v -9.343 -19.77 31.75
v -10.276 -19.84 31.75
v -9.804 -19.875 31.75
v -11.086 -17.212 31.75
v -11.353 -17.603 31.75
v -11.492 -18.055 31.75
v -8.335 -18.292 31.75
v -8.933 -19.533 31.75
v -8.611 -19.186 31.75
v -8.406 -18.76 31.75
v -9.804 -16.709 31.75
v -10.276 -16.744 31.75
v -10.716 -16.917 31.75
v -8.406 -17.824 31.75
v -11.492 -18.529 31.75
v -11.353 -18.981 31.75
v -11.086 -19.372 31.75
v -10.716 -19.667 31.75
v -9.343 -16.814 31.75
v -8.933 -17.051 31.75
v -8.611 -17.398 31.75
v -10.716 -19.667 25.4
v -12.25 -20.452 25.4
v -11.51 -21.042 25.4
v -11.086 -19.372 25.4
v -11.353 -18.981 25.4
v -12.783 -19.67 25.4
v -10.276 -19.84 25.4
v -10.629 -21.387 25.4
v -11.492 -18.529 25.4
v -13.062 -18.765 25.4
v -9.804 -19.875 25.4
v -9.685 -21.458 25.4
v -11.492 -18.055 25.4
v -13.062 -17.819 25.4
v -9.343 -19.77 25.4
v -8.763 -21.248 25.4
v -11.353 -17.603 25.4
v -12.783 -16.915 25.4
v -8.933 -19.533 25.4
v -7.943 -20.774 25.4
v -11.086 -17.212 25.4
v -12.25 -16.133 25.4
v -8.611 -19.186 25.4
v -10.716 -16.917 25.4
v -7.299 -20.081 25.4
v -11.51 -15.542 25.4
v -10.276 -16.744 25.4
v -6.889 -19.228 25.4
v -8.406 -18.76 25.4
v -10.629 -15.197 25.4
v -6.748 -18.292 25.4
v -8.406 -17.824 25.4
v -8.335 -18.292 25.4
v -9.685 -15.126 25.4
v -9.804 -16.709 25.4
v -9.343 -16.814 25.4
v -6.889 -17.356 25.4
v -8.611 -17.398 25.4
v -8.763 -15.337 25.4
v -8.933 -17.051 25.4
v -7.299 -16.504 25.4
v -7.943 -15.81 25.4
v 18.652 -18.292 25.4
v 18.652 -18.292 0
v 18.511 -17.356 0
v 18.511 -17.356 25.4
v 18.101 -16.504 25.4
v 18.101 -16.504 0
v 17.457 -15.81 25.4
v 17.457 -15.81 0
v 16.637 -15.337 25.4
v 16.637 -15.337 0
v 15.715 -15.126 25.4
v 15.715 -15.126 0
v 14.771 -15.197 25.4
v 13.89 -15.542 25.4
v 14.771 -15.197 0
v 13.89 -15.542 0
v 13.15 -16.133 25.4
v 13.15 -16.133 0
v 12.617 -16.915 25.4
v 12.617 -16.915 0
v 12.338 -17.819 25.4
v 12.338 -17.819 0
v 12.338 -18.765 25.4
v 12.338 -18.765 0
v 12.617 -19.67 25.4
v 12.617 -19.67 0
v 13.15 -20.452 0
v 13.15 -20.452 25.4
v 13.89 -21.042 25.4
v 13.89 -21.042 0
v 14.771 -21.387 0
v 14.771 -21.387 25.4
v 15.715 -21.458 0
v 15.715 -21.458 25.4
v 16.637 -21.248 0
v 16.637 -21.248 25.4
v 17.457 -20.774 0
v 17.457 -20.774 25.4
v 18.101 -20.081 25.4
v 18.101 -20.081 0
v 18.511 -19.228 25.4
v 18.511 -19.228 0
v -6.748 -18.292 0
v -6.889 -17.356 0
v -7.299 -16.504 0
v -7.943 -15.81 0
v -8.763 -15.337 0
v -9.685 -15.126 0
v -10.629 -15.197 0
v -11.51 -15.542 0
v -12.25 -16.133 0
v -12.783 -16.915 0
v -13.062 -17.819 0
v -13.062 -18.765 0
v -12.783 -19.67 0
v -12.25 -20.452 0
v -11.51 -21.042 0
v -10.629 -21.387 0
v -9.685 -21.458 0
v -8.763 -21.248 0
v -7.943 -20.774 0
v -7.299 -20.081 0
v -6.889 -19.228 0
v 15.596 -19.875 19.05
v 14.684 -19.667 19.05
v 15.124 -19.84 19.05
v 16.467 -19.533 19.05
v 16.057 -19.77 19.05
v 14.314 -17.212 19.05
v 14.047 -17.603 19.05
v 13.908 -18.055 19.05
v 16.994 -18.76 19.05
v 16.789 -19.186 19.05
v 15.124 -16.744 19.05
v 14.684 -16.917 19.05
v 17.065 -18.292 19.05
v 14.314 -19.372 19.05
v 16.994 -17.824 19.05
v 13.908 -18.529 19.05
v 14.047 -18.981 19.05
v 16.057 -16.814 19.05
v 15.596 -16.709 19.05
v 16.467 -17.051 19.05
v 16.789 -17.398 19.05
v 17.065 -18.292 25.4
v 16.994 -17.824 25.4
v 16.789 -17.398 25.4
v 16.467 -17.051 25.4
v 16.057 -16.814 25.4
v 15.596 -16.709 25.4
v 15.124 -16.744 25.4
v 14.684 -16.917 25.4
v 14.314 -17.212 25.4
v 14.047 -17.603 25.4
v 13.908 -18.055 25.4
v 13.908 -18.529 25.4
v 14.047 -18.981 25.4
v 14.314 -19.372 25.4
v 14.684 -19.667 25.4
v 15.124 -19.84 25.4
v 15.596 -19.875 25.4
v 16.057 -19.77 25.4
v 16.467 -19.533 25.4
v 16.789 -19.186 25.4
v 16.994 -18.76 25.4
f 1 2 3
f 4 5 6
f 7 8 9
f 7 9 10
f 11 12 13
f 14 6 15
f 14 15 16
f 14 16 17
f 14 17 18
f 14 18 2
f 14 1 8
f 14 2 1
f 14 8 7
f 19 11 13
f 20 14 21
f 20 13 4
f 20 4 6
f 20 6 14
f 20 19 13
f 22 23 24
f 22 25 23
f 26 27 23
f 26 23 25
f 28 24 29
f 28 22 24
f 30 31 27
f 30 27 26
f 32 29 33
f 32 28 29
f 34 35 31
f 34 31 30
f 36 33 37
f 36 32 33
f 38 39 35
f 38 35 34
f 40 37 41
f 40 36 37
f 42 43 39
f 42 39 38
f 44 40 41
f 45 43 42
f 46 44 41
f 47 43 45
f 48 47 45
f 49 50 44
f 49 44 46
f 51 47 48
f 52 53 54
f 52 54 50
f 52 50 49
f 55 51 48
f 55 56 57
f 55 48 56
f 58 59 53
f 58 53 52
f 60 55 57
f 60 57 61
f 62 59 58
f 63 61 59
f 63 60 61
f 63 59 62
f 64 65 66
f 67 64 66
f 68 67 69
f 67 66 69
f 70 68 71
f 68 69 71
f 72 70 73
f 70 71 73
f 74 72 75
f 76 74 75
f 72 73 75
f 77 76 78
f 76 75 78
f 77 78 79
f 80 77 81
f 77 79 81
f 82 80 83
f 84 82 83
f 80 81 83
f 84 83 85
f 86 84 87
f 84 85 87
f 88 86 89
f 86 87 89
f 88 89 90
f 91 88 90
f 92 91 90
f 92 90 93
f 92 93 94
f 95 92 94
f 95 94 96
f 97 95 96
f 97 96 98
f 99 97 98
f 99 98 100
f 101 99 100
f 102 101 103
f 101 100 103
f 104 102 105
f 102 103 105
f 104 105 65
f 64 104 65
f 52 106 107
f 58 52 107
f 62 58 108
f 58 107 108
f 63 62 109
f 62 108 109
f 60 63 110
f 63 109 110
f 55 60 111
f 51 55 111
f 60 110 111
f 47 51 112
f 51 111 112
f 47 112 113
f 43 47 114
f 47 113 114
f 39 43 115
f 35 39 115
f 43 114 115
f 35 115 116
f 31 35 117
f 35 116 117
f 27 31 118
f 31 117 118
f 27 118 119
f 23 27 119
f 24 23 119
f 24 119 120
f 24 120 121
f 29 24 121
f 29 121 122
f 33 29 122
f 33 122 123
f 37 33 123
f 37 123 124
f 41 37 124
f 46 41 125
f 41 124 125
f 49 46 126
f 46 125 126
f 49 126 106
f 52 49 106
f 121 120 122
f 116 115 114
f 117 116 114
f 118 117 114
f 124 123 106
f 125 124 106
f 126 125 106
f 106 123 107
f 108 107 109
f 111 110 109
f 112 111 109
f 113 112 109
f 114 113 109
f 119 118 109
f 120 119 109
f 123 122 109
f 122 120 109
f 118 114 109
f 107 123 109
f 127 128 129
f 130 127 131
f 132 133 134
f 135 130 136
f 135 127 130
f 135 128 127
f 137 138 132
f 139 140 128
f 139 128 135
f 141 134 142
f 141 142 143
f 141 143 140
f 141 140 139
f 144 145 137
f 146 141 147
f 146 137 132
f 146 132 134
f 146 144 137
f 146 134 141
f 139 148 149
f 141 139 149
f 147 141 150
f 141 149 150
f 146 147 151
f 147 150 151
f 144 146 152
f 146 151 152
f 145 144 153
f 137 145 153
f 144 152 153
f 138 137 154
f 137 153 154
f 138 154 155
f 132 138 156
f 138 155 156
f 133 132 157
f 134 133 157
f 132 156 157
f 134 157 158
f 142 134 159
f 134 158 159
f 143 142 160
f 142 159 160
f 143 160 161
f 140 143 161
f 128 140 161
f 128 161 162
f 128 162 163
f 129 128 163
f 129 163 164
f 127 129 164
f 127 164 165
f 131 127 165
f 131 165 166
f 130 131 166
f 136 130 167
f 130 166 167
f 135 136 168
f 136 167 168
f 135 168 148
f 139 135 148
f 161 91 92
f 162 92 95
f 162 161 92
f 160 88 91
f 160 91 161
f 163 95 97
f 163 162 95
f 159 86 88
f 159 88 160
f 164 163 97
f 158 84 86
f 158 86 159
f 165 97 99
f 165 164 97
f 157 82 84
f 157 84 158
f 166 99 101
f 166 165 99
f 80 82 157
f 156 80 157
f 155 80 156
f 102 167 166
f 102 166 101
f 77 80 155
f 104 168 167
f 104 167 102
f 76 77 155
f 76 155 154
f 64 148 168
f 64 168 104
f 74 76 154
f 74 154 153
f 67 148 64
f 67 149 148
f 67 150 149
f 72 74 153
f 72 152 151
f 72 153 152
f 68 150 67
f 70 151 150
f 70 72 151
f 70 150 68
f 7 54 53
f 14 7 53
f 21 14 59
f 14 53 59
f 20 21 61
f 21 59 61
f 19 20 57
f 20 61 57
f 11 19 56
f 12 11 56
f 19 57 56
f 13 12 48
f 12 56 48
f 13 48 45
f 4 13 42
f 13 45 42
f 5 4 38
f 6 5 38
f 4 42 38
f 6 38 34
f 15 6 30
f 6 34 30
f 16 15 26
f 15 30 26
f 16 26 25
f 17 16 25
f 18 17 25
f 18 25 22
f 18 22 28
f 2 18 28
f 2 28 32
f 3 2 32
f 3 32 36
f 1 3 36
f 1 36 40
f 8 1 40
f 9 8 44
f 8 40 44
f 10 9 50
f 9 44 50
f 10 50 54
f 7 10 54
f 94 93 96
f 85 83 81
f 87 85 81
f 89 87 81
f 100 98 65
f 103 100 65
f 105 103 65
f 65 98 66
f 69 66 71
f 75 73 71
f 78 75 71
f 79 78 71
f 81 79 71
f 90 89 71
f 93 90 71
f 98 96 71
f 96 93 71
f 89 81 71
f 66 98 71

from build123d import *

# Parameters (mm, degrees)
F0_R     = 3.175
F1_DEPTH = 25.4
F3_R     = 1.5875
F4_DEPTH = 6.35
F5_R     = 1.5875
F6_DEPTH = 6.35


with BuildPart() as f1:
    # F0 (on Top) → F1 (new body)
    with BuildSketch(Plane.XY):
        with Locations((-9.922628291, -18.2920936495)):
            Circle(F0_R)
    extrude(amount=F1_DEPTH)


with BuildPart() as f2_1:
    # F2: copy of F1
    add(f1.part.moved(Location((25.4, 0, 0))))

    # F5 (on face) → F6 (cut)
    with BuildSketch(Plane.XY.offset(25.4)):
        with Locations((15.477371709, -18.2920936495)):
            Circle(F5_R)
    extrude(amount=-F6_DEPTH, mode=Mode.SUBTRACT)


with BuildPart() as f1_1:
    add(f1.part)

    # F3 (on face) → F4 (join)
    with BuildSketch(Plane.XY.offset(25.4)):
        with Locations((-9.922628291, -18.2920936495)):
            Circle(F3_R)
    extrude(amount=F4_DEPTH)


solid = Compound([f2_1.part, f1_1.part])
